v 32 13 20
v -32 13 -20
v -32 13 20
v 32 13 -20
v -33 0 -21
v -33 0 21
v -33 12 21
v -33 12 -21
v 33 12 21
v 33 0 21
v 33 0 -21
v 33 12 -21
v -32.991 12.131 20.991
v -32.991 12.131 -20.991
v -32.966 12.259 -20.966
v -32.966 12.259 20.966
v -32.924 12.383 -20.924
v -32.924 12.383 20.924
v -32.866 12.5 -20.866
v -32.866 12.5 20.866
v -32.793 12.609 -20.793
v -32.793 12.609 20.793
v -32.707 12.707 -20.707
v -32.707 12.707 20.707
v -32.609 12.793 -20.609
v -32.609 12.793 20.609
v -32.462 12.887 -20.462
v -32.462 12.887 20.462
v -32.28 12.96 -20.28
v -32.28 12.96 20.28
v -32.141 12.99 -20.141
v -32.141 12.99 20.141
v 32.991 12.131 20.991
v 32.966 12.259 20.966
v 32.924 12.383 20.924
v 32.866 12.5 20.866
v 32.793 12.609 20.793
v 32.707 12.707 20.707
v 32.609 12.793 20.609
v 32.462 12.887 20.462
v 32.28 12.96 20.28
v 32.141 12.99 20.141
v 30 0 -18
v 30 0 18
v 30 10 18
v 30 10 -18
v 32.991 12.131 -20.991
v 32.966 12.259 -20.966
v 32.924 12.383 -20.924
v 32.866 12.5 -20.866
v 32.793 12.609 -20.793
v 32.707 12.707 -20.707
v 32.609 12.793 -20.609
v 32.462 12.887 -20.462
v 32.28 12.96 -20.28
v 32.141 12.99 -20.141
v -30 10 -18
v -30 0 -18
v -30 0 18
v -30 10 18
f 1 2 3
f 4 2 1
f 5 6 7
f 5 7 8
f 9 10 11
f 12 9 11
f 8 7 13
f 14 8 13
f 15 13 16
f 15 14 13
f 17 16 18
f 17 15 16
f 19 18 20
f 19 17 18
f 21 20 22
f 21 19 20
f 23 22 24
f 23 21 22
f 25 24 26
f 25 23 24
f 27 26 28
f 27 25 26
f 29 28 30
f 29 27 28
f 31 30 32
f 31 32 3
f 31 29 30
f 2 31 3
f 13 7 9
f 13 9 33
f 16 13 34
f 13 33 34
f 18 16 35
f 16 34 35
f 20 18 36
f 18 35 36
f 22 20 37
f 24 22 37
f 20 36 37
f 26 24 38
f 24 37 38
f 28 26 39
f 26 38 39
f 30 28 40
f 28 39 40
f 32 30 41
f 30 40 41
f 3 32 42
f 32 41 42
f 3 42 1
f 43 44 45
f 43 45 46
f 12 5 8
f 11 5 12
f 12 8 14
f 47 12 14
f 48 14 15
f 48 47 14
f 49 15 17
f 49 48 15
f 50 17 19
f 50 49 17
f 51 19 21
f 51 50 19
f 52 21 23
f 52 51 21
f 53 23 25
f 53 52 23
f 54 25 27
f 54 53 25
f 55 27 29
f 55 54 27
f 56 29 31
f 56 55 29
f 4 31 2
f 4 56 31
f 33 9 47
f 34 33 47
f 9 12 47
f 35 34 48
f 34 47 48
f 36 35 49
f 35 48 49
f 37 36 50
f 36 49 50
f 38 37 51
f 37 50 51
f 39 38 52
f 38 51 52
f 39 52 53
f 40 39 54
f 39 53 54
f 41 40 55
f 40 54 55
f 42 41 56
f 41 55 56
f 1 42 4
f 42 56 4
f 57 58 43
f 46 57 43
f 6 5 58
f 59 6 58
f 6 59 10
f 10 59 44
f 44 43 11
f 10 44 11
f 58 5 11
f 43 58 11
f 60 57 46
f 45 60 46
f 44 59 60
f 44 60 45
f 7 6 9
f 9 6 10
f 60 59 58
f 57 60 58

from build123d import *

# Parameters (mm, degrees)
SKETCH1_W           = 66
SKETCH1_H           = 42
SKETCH1_W_2         = 60
SKETCH1_H_2         = 36
BOSS_EXTRUDE1_DEPTH = 10
SKETCH3_W           = 66
SKETCH3_H           = 42
BOSS_EXTRUDE3_DEPTH = 3
FILLET2_R           = 1


with BuildPart() as part:
    # Sketch1 → Boss-Extrude1 (new body)
    with BuildSketch(Plane(origin=(0, 0, 0), x_dir=(1, 0, 0), z_dir=(0, 1, 0))):
        Rectangle(SKETCH1_W, SKETCH1_H)
        Rectangle(SKETCH1_W_2, SKETCH1_H_2, mode=Mode.SUBTRACT)
    extrude(amount=BOSS_EXTRUDE1_DEPTH)

    # Sketch3 → Boss-Extrude3 (add)
    with BuildSketch(Plane(origin=(0, 10, 0), x_dir=(1, 0, 0), z_dir=(0, 1, 0))):
        Rectangle(SKETCH3_W, SKETCH3_H)
    extrude(amount=BOSS_EXTRUDE3_DEPTH)

    # Fillet2
    fillet2_edges = [part.edges().sort_by_distance(p)[0] for p in [
        (-33, 13, 0),
        (0, 13, 21),
        (33, 13, 0),
        (0, 13, -21),
    ]]
    fillet(fillet2_edges, radius=FILLET2_R)


solid = part.part
